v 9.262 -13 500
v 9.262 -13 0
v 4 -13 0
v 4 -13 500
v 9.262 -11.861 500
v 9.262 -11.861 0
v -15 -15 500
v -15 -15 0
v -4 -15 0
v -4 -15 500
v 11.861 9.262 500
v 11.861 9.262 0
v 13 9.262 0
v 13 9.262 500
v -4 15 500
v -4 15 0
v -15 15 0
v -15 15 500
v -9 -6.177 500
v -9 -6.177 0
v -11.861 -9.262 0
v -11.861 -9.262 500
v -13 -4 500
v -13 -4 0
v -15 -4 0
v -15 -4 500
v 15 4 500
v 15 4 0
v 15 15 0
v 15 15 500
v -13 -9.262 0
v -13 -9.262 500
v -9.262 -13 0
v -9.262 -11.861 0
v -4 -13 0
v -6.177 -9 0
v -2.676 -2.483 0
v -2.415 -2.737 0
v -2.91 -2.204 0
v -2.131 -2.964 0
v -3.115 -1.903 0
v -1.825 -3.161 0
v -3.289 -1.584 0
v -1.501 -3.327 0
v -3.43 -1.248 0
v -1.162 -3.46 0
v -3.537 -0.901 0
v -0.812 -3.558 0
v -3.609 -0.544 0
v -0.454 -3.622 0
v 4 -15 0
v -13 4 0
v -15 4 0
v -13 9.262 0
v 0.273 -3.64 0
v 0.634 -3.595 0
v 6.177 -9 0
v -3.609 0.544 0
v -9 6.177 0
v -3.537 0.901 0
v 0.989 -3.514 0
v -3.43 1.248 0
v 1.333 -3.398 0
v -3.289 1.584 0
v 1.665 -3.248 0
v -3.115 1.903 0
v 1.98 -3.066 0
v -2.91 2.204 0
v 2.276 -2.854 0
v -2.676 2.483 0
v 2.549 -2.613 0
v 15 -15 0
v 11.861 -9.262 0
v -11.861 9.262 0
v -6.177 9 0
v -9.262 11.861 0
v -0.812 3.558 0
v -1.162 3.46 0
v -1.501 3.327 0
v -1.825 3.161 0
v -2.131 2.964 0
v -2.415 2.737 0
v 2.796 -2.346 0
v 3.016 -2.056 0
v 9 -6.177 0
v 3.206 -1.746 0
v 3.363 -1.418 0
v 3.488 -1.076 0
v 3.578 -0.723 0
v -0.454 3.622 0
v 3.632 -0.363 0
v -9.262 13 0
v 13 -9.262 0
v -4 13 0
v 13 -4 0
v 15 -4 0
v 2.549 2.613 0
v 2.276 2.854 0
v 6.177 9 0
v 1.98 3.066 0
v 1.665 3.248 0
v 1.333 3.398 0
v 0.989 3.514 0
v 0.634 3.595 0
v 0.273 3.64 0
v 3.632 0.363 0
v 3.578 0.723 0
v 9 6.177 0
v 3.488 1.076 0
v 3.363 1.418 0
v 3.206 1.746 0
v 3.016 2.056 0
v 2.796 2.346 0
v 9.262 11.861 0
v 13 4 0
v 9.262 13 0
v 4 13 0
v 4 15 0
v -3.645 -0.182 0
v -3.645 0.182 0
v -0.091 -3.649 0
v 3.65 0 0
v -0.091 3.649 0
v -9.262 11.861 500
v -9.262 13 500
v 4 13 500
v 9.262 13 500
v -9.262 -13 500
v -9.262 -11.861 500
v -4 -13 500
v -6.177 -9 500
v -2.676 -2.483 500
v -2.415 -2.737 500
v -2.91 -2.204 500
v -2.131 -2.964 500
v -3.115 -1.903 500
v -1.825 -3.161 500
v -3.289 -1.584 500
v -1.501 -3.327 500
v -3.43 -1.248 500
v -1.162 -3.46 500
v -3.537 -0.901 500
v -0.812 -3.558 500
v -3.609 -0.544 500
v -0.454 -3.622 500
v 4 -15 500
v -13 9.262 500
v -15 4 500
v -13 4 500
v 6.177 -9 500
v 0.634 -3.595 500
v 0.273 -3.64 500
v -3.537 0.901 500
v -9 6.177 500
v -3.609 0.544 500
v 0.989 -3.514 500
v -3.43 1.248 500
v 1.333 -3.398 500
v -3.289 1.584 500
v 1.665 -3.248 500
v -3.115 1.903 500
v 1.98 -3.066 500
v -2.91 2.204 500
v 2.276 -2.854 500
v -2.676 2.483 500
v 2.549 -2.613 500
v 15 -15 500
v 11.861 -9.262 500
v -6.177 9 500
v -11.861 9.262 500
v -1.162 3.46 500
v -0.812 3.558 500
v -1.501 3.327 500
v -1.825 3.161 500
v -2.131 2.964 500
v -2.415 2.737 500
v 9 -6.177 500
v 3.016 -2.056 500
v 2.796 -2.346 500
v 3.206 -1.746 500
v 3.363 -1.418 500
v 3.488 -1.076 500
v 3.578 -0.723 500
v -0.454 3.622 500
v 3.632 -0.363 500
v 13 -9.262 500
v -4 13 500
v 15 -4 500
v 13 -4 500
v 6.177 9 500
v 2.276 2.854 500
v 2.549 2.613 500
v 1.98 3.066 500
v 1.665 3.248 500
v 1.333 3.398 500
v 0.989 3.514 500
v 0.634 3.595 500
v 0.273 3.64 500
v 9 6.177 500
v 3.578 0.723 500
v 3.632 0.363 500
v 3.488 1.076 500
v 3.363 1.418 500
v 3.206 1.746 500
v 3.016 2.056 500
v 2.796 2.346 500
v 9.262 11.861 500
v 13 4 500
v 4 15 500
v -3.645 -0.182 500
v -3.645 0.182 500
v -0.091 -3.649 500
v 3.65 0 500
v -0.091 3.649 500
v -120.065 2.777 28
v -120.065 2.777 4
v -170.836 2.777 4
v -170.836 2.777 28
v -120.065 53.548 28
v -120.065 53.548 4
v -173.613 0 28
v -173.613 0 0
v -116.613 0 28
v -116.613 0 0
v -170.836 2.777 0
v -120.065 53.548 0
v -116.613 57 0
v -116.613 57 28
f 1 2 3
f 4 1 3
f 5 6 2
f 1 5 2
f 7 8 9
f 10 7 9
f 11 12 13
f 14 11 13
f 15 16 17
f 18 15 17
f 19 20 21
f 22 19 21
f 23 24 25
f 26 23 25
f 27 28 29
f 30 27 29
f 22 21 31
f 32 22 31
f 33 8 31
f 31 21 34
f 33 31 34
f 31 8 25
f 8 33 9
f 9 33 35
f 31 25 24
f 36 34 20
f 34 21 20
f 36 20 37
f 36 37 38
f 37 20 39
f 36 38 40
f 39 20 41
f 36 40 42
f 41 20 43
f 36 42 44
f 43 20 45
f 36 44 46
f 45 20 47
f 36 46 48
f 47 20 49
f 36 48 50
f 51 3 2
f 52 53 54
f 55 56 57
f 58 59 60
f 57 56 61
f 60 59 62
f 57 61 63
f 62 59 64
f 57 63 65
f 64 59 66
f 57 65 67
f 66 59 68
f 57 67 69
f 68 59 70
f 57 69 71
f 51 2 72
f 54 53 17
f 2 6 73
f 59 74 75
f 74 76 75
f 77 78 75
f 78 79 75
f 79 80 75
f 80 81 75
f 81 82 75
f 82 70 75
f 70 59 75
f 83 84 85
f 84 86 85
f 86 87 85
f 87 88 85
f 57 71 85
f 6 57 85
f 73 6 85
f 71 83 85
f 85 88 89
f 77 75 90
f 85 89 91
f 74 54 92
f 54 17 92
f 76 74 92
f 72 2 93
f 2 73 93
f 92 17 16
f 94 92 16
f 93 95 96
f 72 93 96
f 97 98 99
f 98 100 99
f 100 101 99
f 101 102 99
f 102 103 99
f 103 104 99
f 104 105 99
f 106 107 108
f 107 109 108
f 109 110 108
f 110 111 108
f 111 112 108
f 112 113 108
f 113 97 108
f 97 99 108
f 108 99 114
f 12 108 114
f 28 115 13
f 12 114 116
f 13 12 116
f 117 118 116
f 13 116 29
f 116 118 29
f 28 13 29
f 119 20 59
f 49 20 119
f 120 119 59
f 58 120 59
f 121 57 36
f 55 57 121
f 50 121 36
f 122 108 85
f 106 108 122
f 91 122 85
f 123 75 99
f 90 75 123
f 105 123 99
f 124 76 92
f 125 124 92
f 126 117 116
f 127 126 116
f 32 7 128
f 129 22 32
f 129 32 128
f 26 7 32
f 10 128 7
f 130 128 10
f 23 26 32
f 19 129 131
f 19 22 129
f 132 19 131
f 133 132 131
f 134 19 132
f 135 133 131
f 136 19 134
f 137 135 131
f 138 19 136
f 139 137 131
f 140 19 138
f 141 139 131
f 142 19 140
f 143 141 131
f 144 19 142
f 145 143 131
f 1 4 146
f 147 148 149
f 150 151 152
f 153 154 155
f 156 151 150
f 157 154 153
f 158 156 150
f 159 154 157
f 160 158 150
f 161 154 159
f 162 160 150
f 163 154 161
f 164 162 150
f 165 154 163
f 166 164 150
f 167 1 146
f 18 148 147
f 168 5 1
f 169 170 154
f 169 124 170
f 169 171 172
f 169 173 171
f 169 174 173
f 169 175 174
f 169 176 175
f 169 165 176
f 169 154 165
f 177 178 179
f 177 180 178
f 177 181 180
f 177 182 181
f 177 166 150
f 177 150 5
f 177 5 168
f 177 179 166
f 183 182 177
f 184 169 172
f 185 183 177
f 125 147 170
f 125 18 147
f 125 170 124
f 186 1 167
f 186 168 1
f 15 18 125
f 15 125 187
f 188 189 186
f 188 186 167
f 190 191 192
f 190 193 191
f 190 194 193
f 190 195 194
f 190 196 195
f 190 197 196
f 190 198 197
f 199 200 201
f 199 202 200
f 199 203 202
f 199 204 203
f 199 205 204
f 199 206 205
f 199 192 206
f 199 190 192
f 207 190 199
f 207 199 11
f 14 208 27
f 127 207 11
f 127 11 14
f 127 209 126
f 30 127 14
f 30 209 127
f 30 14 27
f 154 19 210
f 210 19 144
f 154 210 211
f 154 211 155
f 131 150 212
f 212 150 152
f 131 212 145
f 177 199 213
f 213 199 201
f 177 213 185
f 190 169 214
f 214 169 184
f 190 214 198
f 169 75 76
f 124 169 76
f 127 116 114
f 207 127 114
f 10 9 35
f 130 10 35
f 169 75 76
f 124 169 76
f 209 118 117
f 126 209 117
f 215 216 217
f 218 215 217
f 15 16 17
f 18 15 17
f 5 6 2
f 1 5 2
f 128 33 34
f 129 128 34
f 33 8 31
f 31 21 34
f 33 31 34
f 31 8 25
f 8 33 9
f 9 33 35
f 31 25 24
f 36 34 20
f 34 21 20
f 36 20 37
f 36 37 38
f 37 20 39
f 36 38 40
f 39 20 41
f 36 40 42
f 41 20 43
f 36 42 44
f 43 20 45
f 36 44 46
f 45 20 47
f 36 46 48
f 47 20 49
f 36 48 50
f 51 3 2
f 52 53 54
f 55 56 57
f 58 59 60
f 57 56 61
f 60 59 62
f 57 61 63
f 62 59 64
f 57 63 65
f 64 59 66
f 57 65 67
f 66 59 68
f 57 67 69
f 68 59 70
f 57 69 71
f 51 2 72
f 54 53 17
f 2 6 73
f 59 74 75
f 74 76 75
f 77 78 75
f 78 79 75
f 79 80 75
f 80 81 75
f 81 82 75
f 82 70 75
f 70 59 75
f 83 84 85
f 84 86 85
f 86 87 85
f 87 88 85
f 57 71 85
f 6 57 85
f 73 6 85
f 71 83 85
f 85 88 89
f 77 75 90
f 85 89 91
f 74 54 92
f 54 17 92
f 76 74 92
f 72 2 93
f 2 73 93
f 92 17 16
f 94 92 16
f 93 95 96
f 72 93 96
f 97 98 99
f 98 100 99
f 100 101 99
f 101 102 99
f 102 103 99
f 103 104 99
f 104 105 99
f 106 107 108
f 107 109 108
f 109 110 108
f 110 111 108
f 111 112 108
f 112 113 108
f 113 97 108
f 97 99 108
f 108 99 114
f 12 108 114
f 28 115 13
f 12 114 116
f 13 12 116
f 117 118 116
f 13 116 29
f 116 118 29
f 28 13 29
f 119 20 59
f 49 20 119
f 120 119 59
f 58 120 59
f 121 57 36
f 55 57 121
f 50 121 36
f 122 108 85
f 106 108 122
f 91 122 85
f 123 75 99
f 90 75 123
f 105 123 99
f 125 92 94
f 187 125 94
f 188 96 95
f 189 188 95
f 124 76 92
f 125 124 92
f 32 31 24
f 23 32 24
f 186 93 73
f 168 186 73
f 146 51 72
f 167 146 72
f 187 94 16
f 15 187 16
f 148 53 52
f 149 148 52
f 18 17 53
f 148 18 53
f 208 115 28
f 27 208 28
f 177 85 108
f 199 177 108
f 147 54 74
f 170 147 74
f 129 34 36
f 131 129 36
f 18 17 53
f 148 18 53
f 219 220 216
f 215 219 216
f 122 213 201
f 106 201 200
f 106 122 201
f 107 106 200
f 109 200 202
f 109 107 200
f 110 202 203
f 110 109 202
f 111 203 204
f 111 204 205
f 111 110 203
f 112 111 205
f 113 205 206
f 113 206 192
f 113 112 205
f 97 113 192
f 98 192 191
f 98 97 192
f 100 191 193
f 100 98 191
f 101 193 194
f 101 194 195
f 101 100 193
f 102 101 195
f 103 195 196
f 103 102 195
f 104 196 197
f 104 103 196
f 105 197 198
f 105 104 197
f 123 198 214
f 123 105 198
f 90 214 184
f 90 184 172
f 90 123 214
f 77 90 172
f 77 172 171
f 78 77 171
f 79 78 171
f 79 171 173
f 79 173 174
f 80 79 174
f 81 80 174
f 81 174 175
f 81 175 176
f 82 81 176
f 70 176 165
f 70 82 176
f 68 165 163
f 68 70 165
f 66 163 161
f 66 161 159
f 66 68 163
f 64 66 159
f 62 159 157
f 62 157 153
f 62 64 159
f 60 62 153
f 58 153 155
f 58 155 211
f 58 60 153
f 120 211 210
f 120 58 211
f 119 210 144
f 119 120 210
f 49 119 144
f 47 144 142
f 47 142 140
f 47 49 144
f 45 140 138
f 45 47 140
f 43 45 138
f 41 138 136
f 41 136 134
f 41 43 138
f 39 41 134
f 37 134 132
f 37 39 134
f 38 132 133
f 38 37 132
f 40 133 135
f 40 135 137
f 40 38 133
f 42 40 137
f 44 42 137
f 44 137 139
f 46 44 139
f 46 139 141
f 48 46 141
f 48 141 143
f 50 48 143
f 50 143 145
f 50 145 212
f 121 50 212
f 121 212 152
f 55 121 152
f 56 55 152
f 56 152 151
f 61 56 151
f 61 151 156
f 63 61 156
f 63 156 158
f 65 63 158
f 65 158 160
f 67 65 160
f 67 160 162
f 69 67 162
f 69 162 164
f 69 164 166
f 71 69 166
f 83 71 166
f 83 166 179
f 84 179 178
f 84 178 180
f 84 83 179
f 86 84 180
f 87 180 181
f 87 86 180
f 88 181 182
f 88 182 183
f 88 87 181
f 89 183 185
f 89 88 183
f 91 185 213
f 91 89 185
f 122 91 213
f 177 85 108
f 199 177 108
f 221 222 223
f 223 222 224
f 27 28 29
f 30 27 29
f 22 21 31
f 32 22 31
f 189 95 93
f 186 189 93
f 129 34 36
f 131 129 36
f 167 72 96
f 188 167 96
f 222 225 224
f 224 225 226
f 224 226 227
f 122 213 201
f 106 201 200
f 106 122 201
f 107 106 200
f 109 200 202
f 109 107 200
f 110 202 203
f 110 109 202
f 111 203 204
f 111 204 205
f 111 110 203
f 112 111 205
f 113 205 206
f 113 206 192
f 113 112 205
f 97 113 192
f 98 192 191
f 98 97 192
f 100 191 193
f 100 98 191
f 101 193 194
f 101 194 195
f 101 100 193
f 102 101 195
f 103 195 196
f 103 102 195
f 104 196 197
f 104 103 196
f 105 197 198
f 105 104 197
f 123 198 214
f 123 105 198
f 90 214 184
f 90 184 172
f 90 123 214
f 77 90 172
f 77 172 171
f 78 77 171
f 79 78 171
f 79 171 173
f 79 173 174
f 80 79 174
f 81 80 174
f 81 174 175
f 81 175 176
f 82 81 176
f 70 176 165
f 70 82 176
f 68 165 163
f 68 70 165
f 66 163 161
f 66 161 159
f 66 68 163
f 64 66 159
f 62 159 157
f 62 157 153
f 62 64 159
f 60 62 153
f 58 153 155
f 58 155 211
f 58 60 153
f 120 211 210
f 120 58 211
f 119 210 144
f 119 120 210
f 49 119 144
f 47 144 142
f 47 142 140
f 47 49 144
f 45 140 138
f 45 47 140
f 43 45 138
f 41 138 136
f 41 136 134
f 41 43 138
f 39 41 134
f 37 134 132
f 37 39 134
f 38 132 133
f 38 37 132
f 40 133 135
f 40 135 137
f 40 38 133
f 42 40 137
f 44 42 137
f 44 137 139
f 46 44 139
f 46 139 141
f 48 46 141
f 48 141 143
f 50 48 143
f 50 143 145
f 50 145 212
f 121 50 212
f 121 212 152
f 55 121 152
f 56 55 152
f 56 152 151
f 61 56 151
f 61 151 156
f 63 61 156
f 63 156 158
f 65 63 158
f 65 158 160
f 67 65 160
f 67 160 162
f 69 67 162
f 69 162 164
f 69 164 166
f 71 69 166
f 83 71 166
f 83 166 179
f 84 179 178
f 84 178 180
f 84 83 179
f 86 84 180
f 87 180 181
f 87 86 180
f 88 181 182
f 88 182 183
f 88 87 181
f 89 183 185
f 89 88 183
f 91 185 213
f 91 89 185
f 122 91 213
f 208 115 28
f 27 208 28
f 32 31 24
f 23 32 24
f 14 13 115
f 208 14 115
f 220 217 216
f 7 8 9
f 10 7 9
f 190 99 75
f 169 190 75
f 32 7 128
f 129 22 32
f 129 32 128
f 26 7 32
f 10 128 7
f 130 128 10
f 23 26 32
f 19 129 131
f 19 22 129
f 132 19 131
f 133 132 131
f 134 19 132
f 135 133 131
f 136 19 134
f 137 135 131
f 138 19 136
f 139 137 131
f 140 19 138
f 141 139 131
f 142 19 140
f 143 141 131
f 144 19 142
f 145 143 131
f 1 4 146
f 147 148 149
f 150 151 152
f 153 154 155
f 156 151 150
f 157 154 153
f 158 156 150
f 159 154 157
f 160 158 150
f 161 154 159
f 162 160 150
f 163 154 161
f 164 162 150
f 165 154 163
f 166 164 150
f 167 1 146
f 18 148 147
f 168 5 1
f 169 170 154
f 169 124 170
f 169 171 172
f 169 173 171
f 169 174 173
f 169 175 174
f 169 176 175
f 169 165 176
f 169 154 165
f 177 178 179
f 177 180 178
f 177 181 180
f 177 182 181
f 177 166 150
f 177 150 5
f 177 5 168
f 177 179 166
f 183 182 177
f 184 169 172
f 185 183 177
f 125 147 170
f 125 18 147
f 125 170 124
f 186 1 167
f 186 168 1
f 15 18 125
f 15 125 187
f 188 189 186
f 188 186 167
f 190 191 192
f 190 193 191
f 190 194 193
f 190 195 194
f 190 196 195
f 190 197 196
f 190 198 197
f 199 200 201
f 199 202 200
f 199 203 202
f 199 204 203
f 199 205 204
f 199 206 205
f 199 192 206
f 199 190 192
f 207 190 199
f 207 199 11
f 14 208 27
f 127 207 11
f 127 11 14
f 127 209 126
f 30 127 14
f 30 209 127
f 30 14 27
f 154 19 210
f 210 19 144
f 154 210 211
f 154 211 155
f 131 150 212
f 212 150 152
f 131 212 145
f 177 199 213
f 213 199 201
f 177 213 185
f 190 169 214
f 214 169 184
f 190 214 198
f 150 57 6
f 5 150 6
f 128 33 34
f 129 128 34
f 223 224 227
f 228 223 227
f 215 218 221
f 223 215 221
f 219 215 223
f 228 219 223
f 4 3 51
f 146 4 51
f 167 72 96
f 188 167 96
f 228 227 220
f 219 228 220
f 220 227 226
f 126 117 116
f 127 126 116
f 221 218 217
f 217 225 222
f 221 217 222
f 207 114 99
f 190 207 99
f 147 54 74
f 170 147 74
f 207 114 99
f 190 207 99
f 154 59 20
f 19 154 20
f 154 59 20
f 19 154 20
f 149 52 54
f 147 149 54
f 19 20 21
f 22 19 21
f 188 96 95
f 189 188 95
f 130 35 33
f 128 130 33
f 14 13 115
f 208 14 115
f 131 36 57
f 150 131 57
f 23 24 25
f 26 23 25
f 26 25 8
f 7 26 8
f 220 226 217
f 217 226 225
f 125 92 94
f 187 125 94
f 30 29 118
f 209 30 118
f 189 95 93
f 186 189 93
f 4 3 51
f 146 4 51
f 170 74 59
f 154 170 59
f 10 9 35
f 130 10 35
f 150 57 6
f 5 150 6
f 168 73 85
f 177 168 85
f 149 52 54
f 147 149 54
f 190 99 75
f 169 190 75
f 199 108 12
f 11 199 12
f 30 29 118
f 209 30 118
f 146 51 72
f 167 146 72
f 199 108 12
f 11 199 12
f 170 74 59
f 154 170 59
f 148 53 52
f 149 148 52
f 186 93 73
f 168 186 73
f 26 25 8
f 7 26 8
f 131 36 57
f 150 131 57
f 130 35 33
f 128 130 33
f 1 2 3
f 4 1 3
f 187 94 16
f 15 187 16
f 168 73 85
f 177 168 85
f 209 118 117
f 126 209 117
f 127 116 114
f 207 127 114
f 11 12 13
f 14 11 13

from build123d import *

# Parameters (mm, degrees)
F0_R     = 3.65
F1_DEPTH = 500
F3_DEPTH = 28
F4_DEPTH = 4
F5_DEPTH = 500


with BuildPart() as f1:
    # F0 (on Top) → F1 (new body)
    with BuildSketch(Plane.XY):
        Polygon((-4, 13), (-4, 15), (-15, 15), (-15, 4), (-13, 4), (-13, 9.2621), (-11.860803, 9.2621), (-9, 6.177421), (-9, 0), (-9, -6.177421), (-11.860803, -9.2621), (-13, -9.2621), (-13, -4), (-15, -4), (-15, -15), (-4, -15), (-4, -13), (-9.2621, -13), (-9.2621, -11.860803), (-6.177421, -9), (0, -9), (6.177421, -9), (9.2621, -11.860803), (9.2621, -13), (4, -13), (4, -15), (15, -15), (15, -4), (13, -4), (13, -9.2621), (11.860803, -9.2621), (9, -6.177421), (9, 0), (9, 6.177421), (11.860803, 9.2621), (13, 9.2621), (13, 4), (15, 4), (15, 15), (4, 15), (4, 13), (9.2621, 13), (9.2621, 11.860803), (6.177421, 9), (0, 9), (-6.177421, 9), (-9.2621, 11.860803), (-9.2621, 13), align=None)
        Circle(F0_R, mode=Mode.SUBTRACT)
    extrude(amount=F1_DEPTH)


with BuildPart() as f3:
    # F2 (on Top) → F3 (new body)
    with BuildSketch(Plane.XY):
        Polygon((-170.836399, 2.776854), (-173.613252, 0), (-116.613252, 0), (-116.613252, 57), (-120.065376, 53.547876), (-120.065376, 2.776854), align=None)
    extrude(amount=F3_DEPTH)

    # F2 (on Top) → F4 (join)
    with BuildSketch(Plane.XY):
        Polygon((-120.065376, 53.547876), (-170.836399, 2.776854), (-120.065376, 2.776854), align=None)
    extrude(amount=F4_DEPTH)


with BuildPart() as f5:
    # F0 (on Top) → F5 (new body)
    with BuildSketch(Plane.XY):
        Polygon((-4, 13), (-4, 15), (-15, 15), (-15, 4), (-13, 4), (-13, 9.2621), (-11.860803, 9.2621), (-9, 6.177421), (-9, 0), (-9, -6.177421), (-11.860803, -9.2621), (-13, -9.2621), (-13, -4), (-15, -4), (-15, -15), (-4, -15), (-4, -13), (-9.2621, -13), (-9.2621, -11.860803), (-6.177421, -9), (0, -9), (6.177421, -9), (9.2621, -11.860803), (9.2621, -13), (4, -13), (4, -15), (15, -15), (15, -4), (13, -4), (13, -9.2621), (11.860803, -9.2621), (9, -6.177421), (9, 0), (9, 6.177421), (11.860803, 9.2621), (13, 9.2621), (13, 4), (15, 4), (15, 15), (4, 15), (4, 13), (9.2621, 13), (9.2621, 11.860803), (6.177421, 9), (0, 9), (-6.177421, 9), (-9.2621, 11.860803), (-9.2621, 13), align=None)
        Circle(F0_R, mode=Mode.SUBTRACT)
    extrude(amount=F5_DEPTH)


solid = Compound([f1.part, f3.part, f5.part])
